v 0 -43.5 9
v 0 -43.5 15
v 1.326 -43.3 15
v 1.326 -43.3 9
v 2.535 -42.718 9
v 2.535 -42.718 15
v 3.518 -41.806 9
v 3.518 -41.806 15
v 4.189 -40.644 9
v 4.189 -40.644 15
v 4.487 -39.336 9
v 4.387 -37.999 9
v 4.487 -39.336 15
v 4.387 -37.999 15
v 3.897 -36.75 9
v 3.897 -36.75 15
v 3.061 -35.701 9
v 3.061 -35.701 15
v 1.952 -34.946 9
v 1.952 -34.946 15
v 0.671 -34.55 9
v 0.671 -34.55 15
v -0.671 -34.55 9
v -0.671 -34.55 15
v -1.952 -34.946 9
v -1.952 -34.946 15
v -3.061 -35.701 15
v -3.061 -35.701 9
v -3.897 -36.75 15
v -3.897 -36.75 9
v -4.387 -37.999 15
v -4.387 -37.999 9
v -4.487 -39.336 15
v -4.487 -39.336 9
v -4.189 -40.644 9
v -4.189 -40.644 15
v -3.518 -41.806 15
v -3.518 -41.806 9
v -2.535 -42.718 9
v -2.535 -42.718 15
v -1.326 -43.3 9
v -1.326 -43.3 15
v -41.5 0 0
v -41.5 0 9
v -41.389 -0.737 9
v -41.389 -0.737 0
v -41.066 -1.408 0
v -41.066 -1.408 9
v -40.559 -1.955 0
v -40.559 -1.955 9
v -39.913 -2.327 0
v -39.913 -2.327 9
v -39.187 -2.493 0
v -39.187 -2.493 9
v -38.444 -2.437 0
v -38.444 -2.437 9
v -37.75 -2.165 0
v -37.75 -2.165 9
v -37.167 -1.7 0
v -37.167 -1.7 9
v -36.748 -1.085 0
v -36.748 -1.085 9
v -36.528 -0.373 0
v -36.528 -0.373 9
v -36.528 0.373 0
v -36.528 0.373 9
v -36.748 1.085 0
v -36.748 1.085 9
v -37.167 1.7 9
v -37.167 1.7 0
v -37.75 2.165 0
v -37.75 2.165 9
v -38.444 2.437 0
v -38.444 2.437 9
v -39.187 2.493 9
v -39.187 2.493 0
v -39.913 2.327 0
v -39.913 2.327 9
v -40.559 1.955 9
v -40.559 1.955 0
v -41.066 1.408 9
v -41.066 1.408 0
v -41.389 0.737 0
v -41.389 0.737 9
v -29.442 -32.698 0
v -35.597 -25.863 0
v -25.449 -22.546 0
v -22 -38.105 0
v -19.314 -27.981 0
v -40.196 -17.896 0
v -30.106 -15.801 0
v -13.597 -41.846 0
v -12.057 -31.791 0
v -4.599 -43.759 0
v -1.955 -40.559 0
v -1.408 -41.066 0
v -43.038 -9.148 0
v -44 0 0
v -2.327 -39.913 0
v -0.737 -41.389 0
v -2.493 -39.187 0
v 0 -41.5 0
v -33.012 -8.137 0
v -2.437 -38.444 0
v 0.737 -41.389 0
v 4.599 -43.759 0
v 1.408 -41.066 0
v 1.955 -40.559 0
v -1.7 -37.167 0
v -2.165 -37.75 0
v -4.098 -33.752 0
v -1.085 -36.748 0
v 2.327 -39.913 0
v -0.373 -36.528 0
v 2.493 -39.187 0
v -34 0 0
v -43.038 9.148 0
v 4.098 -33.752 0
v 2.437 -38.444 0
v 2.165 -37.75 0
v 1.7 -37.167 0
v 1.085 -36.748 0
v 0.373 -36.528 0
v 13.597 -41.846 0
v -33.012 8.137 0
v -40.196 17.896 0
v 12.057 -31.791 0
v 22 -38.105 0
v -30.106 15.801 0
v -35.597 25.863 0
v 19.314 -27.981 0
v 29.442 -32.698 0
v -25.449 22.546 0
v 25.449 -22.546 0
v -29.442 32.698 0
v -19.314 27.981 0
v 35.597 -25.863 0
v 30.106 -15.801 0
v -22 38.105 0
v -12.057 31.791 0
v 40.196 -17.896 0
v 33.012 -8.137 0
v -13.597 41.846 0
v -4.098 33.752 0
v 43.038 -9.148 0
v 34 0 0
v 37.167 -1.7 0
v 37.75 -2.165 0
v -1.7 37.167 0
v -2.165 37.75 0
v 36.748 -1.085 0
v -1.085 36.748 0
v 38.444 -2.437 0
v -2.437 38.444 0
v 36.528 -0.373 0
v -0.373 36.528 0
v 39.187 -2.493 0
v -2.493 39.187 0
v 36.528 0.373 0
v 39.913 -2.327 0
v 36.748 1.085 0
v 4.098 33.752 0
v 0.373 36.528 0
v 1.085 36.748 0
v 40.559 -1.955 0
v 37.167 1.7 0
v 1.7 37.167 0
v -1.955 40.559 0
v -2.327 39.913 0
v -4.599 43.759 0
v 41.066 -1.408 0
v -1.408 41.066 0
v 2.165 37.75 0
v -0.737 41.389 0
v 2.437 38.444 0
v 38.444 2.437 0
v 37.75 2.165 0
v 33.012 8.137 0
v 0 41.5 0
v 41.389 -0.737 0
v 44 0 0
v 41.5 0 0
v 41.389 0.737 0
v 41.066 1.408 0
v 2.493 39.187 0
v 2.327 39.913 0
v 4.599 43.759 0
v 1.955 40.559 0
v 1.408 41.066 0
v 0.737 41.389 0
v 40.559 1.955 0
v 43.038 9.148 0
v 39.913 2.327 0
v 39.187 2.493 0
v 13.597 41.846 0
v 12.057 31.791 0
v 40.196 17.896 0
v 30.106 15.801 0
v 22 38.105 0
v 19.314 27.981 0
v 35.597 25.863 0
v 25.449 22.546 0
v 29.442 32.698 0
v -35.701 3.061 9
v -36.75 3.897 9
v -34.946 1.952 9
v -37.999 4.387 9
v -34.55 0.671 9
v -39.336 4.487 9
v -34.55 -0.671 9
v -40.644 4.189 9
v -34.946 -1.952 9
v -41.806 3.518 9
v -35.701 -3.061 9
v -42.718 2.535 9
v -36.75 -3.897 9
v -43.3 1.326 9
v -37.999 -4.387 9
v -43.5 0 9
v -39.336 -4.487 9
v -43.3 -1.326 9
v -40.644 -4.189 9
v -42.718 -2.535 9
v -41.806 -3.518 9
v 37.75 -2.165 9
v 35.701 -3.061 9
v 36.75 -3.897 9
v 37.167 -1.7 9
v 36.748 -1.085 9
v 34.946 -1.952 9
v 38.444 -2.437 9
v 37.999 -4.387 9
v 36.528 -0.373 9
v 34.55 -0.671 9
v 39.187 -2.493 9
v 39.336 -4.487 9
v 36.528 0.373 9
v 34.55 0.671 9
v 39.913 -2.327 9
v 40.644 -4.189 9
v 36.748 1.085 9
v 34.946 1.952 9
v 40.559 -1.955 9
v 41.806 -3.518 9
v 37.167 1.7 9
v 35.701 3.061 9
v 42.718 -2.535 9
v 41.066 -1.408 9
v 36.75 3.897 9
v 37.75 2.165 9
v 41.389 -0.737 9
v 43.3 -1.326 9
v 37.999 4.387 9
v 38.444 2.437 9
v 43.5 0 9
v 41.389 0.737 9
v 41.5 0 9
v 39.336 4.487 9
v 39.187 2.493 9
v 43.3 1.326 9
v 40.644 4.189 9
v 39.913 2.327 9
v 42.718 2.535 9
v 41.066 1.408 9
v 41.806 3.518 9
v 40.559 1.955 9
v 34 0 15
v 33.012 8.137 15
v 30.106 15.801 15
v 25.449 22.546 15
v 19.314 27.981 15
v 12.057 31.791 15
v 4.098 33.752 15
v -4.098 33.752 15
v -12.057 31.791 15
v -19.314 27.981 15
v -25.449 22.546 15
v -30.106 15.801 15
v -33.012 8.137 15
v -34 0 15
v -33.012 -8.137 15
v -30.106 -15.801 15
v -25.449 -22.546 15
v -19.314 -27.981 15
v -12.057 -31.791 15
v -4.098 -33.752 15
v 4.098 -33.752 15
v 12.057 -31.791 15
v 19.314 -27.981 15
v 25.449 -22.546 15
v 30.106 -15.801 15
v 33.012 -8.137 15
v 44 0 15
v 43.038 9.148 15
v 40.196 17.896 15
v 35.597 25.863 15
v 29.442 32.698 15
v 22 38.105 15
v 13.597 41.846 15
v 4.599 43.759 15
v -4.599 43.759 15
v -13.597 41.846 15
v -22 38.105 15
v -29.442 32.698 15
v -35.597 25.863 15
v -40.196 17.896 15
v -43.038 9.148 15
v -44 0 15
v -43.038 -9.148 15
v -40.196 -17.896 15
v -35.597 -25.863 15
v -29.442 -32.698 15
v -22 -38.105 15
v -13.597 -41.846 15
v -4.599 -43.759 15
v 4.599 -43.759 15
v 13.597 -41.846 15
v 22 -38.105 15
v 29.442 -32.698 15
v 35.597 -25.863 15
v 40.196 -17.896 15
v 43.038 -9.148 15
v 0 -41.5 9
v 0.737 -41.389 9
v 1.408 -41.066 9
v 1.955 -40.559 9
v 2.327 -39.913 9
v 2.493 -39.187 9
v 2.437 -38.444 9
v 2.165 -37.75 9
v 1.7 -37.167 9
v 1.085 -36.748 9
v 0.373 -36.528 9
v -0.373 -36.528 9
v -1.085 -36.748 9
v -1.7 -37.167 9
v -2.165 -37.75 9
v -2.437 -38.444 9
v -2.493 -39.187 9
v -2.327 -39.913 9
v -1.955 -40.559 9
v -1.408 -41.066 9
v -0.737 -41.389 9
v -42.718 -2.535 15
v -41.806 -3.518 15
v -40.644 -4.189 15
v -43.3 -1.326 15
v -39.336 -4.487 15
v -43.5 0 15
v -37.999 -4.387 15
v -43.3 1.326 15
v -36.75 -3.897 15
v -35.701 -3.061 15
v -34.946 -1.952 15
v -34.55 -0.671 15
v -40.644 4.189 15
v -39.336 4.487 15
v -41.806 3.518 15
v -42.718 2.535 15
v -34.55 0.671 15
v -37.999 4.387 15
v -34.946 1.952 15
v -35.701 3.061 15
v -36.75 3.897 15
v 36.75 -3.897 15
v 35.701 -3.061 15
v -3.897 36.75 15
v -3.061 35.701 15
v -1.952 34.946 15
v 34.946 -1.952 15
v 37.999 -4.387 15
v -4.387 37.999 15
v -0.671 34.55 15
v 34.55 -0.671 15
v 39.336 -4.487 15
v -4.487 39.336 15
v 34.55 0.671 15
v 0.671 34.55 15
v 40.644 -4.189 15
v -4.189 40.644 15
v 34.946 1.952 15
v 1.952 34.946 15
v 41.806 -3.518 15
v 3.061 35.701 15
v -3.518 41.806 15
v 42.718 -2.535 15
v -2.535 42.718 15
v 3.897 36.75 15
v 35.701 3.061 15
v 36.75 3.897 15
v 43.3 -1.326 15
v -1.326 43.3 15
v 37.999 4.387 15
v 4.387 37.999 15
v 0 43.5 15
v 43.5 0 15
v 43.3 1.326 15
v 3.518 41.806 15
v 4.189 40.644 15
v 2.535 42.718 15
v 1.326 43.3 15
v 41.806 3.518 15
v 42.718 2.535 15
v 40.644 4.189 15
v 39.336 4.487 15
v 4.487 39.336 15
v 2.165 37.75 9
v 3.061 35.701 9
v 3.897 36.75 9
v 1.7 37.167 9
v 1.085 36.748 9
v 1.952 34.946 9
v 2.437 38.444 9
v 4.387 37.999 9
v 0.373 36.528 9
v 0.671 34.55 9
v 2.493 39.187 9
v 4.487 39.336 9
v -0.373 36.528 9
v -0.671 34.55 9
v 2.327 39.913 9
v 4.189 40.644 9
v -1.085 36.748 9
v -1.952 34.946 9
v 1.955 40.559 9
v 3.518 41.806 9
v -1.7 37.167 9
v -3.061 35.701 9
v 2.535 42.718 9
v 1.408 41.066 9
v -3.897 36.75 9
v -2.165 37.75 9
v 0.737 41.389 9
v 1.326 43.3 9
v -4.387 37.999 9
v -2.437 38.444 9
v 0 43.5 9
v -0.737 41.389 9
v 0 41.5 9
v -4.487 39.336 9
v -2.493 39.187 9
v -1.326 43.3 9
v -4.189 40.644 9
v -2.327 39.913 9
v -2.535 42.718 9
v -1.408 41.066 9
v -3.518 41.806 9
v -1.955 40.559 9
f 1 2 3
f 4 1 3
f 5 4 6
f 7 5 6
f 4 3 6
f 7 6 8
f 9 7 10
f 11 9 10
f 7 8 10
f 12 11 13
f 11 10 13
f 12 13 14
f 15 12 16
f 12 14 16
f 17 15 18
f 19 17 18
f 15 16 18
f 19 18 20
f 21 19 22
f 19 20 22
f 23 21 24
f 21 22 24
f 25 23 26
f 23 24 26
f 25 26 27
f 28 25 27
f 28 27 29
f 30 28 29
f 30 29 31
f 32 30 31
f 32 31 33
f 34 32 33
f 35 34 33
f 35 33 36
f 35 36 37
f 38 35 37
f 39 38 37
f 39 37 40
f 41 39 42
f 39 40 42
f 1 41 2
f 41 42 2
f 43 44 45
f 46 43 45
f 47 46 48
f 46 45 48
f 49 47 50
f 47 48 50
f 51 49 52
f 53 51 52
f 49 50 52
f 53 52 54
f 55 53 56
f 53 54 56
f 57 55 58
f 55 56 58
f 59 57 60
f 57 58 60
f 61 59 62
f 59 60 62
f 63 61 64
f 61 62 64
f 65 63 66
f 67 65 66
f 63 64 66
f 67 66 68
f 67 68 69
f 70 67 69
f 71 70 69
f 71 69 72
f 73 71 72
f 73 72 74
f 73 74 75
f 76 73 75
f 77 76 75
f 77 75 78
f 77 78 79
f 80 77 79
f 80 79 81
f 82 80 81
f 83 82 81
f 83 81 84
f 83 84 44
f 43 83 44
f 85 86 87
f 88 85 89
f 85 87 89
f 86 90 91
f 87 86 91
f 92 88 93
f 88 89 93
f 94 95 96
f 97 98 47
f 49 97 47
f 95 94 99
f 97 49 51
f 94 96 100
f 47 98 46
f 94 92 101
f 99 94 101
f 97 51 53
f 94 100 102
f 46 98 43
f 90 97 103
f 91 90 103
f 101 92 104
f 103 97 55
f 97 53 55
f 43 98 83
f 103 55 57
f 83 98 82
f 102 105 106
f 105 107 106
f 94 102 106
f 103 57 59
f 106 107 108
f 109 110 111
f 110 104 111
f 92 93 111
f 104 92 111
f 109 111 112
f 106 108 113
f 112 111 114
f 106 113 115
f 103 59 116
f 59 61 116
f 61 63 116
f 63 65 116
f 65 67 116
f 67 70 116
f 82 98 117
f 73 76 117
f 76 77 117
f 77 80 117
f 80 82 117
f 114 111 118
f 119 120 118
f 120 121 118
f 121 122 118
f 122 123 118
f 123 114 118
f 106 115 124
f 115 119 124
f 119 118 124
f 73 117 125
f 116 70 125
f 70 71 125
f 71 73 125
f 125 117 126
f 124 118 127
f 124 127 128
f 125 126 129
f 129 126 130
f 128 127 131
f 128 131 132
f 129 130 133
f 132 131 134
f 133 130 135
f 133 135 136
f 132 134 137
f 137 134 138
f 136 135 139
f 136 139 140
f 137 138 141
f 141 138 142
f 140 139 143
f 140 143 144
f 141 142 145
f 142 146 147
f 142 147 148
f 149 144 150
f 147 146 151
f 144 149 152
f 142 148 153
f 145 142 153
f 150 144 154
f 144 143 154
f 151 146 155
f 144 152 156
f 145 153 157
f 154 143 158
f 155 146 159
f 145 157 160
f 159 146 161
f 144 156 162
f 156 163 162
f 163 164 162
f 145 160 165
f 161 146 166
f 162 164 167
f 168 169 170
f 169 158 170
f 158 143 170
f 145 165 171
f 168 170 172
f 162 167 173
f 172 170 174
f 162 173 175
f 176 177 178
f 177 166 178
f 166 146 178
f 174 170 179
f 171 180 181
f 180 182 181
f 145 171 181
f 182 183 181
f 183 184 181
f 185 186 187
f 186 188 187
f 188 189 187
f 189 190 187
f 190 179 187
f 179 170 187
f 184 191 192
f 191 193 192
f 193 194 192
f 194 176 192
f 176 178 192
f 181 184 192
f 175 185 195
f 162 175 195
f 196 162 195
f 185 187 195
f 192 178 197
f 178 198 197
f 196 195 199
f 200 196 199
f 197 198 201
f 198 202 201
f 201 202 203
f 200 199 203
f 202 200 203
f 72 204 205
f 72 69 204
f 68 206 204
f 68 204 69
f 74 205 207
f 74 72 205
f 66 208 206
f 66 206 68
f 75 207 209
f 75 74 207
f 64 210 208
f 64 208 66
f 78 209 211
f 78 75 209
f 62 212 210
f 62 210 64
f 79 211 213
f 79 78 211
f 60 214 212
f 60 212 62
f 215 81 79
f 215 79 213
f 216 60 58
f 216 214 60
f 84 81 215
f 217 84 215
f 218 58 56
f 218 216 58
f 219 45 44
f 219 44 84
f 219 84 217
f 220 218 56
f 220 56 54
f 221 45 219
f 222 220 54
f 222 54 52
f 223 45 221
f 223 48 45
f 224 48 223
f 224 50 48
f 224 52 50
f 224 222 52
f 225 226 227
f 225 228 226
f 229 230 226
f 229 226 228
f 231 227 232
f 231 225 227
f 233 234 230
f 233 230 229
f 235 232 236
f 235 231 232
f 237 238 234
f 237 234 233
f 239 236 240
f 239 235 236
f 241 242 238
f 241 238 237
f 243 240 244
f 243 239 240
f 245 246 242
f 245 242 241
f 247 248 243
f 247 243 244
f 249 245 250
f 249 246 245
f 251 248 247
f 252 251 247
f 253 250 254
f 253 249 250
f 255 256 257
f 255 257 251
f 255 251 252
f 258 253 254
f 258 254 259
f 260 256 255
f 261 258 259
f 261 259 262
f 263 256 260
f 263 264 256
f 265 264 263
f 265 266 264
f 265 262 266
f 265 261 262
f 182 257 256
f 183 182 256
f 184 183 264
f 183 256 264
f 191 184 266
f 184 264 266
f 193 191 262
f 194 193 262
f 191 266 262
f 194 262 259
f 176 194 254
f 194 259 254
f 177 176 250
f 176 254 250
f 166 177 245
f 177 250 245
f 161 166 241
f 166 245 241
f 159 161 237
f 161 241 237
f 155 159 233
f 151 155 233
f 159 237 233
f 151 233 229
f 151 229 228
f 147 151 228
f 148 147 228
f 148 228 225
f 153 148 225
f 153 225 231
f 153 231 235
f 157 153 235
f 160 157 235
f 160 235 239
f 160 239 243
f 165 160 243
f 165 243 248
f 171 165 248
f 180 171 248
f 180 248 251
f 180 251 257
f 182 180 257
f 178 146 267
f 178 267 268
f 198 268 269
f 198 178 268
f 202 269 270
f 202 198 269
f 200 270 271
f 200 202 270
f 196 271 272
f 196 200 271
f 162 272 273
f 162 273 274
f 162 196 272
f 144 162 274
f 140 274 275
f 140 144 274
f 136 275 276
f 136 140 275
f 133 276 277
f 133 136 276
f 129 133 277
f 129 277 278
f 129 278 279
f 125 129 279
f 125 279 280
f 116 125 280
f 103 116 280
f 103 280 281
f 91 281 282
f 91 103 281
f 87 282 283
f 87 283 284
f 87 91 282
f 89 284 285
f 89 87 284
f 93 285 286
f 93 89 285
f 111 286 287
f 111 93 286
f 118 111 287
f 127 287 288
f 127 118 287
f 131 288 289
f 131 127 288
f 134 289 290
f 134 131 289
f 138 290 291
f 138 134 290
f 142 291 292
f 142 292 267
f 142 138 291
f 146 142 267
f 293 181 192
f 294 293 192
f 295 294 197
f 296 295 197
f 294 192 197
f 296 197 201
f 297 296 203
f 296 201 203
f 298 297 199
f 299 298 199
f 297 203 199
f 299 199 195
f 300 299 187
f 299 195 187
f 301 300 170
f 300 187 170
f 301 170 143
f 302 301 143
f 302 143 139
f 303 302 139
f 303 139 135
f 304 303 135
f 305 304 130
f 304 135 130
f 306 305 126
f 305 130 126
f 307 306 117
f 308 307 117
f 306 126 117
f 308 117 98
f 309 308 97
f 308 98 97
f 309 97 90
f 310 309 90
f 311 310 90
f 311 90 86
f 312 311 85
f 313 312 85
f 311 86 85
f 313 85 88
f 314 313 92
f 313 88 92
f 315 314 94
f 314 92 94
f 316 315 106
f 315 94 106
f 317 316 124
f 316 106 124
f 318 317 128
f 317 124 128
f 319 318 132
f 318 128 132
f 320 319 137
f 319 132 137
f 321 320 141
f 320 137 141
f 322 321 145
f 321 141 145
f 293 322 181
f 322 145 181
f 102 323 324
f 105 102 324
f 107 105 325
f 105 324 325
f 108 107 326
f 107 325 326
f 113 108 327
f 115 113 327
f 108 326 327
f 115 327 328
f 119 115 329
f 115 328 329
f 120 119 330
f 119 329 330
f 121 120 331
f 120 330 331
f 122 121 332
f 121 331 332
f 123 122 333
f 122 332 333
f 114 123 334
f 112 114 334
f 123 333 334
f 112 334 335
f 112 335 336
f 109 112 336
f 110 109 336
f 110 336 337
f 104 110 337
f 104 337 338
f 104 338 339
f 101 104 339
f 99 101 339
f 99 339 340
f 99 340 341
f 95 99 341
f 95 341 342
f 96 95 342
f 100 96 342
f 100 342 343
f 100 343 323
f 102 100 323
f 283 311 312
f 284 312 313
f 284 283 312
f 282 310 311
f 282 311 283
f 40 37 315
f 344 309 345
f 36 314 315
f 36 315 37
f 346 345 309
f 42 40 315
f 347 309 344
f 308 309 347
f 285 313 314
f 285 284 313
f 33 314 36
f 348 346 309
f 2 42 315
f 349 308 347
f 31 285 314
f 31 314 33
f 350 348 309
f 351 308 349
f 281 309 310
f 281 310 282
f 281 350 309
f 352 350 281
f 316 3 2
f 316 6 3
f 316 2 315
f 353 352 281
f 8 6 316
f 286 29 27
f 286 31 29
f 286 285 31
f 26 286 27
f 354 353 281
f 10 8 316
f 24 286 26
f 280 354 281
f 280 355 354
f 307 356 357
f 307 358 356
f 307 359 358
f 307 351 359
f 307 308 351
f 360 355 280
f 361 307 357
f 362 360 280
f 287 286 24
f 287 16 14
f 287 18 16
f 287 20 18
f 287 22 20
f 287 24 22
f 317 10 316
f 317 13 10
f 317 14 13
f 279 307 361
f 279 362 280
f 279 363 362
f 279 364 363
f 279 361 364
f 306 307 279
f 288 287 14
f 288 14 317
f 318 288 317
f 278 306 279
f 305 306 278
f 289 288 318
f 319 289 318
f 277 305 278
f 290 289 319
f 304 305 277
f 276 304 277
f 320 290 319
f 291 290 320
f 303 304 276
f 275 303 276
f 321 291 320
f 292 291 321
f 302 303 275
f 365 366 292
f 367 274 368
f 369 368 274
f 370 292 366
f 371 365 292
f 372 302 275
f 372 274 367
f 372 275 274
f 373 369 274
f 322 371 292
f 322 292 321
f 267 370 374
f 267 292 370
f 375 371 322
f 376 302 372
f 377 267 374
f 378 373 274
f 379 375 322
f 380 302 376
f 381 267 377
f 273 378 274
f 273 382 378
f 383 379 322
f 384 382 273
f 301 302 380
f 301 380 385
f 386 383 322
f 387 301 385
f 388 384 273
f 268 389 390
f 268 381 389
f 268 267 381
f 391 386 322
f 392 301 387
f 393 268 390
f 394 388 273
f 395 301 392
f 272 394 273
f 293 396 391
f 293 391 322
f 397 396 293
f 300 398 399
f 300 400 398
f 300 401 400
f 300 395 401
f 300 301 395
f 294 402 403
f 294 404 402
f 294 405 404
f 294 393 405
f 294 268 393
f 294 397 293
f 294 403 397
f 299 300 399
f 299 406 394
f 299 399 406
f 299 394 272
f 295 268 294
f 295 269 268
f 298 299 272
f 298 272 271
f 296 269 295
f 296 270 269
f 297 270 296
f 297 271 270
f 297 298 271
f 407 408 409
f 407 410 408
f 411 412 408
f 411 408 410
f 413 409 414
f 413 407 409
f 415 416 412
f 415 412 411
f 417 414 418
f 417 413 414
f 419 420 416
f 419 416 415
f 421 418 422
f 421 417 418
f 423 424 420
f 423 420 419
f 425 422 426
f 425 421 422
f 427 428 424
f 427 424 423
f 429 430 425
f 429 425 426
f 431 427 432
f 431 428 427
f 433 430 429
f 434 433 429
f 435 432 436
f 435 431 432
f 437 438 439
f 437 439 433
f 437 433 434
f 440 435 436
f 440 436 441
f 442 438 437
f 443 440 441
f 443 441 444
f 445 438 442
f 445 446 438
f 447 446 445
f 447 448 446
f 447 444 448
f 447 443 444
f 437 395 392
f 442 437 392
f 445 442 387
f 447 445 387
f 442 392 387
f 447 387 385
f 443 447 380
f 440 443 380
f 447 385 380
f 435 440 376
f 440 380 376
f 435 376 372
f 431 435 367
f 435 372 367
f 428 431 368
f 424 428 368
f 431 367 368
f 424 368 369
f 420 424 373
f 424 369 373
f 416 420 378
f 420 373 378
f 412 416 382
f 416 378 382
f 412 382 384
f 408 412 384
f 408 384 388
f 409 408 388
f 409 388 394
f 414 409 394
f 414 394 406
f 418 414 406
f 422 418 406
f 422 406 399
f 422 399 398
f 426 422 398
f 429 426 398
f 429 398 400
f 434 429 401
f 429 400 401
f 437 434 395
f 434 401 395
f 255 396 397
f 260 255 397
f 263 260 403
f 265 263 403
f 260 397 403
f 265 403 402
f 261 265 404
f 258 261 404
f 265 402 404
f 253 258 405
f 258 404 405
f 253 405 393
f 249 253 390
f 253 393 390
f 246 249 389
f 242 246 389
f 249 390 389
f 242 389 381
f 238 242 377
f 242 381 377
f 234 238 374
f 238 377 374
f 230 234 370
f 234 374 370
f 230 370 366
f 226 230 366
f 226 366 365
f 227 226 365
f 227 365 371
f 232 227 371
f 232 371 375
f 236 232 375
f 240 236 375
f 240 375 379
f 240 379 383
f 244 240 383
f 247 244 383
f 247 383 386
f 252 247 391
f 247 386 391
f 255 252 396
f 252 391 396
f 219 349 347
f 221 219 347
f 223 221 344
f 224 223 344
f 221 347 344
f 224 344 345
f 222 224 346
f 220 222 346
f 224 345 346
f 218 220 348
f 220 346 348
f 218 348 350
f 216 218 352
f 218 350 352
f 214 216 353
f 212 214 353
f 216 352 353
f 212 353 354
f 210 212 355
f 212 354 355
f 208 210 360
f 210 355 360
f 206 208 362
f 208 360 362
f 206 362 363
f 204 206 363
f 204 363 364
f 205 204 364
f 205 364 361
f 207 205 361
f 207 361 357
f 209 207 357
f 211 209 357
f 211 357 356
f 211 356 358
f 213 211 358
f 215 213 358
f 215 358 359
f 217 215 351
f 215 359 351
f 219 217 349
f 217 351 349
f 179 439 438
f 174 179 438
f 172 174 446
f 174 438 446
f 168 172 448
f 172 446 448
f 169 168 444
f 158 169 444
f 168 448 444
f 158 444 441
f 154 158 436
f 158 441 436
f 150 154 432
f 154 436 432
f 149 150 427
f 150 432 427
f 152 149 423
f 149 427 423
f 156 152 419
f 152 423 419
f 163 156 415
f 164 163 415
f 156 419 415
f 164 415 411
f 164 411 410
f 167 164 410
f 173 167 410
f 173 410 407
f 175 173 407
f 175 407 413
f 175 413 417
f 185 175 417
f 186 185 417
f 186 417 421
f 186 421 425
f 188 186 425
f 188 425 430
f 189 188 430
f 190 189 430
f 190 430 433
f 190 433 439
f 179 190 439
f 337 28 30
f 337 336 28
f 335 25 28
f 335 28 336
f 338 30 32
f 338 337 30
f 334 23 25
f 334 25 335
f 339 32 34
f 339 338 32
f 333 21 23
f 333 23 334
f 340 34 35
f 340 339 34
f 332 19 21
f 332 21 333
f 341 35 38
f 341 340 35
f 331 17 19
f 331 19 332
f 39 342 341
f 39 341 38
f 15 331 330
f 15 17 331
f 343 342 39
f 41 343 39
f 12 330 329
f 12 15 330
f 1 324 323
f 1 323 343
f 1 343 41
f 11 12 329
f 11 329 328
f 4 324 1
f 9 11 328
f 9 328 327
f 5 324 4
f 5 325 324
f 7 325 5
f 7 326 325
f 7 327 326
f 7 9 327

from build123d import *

# Parameters (mm, degrees)
SKETCH_1_R               = 44
SKETCH_1_R_2             = 34
EXTRUDE_1_DEPTH          = 15
SKETCH_2_R               = 4.5
CUT_EXTRUDE_1_DEPTH      = 6
SKETCH_3_R               = 2.5
CUT_EXTRUDE_2_DEPTH      = 11
PATTERN_CIRCULAR_1_COUNT = 4


with BuildPart() as part:
    # 草图1 → 凸台-拉伸1 (new body)
    with BuildSketch(Plane.XY):
        Circle(SKETCH_1_R)
        Circle(SKETCH_1_R_2, mode=Mode.SUBTRACT)
    extrude(amount=EXTRUDE_1_DEPTH)

    # 草图2 → 切除-拉伸1 (cut)
    with BuildSketch(Plane.XY.offset(15)):
        with Locations((39, 0)):
            Circle(SKETCH_2_R)
    cut_extrude_1 = extrude(amount=-CUT_EXTRUDE_1_DEPTH, mode=Mode.SUBTRACT)

    # 草图3 → 切除-拉伸2 (cut)
    with BuildSketch(Plane.XY.offset(9)):
        with Locations((39, 0)):
            Circle(SKETCH_3_R)
    cut_extrude_2 = extrude(amount=-CUT_EXTRUDE_2_DEPTH, mode=Mode.SUBTRACT)

    # 阵列(圆周)1: 切除-拉伸1, 切除-拉伸2 ×4 about axis
    pattern_circular_1_axis = Axis((0, 0, 0), (0, 0, 1))
    for i in range(1, PATTERN_CIRCULAR_1_COUNT):
        add(cut_extrude_1.rotate(pattern_circular_1_axis, i * 360 / PATTERN_CIRCULAR_1_COUNT), mode=Mode.SUBTRACT)
        add(cut_extrude_2.rotate(pattern_circular_1_axis, i * 360 / PATTERN_CIRCULAR_1_COUNT), mode=Mode.SUBTRACT)


solid = part.part
